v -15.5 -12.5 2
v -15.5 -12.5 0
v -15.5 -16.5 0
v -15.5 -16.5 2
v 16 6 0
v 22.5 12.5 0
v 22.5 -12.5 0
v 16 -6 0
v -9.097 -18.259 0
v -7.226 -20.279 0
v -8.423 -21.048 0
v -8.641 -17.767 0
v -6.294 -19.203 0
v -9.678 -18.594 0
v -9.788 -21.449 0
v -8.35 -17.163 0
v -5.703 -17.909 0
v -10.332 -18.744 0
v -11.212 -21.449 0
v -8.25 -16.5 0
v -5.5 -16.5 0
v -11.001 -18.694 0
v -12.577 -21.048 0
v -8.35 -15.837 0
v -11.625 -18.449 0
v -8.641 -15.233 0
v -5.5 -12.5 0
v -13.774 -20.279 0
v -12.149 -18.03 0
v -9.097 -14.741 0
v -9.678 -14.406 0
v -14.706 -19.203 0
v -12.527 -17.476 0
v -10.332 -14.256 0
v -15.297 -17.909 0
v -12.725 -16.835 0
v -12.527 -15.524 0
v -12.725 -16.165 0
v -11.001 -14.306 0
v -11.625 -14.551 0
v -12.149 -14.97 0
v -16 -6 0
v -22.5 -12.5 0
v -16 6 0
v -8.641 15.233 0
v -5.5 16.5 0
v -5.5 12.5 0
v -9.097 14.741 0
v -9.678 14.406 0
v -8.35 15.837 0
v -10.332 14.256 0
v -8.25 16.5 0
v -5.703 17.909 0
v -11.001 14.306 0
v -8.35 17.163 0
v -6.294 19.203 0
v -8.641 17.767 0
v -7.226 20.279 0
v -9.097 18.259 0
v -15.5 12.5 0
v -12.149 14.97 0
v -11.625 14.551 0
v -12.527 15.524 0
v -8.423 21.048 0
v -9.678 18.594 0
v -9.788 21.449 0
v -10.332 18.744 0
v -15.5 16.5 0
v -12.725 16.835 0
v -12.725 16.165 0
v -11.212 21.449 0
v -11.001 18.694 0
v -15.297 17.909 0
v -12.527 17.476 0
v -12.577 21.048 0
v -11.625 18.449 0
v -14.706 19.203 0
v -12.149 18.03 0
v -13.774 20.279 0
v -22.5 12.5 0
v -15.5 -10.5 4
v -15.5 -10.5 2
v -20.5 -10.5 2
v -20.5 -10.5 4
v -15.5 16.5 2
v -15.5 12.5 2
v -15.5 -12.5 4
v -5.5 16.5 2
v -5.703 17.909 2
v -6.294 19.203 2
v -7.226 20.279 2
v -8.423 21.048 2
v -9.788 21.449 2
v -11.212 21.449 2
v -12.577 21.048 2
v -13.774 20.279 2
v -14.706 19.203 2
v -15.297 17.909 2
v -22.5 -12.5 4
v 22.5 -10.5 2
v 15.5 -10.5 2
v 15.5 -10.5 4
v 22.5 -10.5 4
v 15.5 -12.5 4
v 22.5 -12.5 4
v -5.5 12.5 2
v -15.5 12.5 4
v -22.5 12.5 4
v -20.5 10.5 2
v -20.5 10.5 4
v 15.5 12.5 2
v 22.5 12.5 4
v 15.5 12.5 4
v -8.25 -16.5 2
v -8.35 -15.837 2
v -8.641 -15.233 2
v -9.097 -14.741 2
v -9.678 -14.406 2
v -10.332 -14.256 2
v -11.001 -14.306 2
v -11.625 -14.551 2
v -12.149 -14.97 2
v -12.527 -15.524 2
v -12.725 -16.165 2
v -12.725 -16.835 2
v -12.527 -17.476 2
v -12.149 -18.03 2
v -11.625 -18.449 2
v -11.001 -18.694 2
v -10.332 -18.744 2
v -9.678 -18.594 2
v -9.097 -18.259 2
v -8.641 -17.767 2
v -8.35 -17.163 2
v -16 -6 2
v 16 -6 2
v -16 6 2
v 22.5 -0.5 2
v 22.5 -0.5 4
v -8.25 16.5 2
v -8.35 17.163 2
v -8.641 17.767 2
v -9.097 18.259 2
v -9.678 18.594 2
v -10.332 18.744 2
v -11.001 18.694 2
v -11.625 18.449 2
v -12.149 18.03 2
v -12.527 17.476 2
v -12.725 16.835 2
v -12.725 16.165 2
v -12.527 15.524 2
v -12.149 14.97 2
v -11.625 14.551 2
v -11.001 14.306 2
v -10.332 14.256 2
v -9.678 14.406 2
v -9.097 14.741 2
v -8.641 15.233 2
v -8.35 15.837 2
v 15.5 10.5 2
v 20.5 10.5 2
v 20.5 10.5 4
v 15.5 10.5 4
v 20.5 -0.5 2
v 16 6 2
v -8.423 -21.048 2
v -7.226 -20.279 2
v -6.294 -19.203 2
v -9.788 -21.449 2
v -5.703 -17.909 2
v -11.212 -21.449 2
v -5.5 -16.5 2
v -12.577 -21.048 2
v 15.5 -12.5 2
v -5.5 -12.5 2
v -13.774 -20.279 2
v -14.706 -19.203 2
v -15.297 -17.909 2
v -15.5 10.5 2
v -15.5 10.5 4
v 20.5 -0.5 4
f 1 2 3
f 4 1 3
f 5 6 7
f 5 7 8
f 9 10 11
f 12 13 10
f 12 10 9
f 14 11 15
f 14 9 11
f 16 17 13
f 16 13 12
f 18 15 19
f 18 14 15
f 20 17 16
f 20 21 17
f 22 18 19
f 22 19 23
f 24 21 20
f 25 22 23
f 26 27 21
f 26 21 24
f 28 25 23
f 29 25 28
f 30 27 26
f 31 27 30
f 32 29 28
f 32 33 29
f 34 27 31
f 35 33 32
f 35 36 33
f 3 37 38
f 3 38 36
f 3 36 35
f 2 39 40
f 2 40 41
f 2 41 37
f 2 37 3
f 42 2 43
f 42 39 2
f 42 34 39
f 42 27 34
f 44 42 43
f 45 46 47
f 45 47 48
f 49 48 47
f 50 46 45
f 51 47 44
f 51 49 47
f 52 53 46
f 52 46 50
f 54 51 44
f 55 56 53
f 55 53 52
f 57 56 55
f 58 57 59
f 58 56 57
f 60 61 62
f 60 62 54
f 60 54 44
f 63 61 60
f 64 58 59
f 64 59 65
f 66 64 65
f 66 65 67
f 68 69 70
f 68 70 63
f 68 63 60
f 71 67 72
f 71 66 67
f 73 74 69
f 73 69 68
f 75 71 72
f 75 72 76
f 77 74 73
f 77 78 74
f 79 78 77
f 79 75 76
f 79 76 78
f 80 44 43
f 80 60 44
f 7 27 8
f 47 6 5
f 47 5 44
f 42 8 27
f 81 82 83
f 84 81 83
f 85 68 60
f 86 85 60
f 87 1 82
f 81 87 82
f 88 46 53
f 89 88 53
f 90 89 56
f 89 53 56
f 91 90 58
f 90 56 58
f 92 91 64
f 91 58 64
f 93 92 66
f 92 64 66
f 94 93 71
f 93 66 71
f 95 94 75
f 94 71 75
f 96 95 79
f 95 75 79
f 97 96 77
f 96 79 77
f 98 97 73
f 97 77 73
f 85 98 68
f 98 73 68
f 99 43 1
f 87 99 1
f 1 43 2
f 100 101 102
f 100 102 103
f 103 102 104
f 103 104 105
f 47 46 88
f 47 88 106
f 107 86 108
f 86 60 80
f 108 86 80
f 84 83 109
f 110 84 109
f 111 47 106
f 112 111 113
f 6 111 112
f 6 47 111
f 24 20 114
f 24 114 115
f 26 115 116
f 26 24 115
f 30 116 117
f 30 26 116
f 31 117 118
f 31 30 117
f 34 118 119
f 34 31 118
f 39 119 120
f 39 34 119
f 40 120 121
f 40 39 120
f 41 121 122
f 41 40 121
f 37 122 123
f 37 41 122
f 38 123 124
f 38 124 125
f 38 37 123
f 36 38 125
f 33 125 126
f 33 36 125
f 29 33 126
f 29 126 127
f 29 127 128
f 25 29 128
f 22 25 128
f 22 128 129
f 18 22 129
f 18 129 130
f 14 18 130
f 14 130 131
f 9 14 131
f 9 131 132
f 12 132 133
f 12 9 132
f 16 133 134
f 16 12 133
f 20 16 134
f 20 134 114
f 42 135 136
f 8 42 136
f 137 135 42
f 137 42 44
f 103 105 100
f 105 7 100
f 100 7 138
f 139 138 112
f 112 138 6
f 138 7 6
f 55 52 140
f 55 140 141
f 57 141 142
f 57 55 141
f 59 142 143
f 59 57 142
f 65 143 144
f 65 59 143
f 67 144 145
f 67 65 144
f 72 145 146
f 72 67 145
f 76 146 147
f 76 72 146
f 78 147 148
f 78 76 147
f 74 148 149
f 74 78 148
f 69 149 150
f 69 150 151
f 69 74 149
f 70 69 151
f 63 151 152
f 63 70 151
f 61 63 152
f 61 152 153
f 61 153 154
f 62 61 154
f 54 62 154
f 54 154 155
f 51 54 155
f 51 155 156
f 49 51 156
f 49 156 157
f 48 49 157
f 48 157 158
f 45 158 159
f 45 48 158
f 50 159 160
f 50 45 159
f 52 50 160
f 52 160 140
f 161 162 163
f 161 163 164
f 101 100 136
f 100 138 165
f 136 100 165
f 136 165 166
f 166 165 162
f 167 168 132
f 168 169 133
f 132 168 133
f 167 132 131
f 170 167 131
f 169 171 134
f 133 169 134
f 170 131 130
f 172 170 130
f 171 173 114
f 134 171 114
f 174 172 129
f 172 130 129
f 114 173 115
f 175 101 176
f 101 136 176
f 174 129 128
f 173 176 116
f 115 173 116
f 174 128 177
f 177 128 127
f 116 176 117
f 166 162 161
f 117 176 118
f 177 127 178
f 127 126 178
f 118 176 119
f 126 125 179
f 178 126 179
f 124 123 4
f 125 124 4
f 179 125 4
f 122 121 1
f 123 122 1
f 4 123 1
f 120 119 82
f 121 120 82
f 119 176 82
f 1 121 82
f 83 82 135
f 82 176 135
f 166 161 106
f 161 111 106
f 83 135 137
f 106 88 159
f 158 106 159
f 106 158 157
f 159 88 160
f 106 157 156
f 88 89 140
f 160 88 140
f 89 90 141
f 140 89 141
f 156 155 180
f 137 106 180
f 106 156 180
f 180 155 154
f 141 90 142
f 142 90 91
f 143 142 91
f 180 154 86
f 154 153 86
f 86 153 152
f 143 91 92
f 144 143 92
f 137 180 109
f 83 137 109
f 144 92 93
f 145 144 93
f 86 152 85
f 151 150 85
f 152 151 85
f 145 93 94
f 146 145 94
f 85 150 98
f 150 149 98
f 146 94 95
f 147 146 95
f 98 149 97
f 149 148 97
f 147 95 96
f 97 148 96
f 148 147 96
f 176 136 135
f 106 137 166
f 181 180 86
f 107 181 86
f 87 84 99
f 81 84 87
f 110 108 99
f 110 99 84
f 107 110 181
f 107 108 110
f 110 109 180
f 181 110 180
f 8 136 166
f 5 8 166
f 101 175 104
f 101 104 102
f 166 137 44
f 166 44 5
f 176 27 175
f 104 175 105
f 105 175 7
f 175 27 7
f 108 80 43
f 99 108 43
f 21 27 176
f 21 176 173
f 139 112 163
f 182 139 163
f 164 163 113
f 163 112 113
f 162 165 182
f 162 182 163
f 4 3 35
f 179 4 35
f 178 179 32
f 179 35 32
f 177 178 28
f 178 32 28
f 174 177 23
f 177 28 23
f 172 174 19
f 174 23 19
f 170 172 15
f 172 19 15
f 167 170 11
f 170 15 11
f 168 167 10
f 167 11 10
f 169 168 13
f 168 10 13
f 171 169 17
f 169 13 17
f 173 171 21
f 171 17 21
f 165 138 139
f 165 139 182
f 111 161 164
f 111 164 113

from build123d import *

# Parameters (mm, degrees)
SKETCH002_R  = 2.25
PAD002_DEPTH = 2
SKETCH003_W  = 7
SKETCH003_H  = 2
PAD003_DEPTH = 2
SKETCH004_W  = 32
SKETCH004_H  = 12
POCKET_DEPTH = 2


with BuildPart() as part:
    # Sketch002 → Pad002 (new body)
    with BuildSketch(Plane.XY):
        with BuildLine():
            Line((22.5, 12.5), (22.5, -12.5))
            Line((22.5, -12.5), (-5.5, -12.5))
            Line((-5.5, -12.5), (-5.5, -16.5))
            ThreePointArc((-15.5, -16.5), (-10.5, -21.5), (-5.5, -16.5))
            Line((-15.5, -12.5), (-15.5, -16.5))
            Line((-22.5, -12.5), (-15.5, -12.5))
            Line((-22.5, 12.5), (-22.5, -12.5))
            Line((-15.5, 12.5), (-22.5, 12.5))
            Line((-15.5, 16.5), (-15.5, 12.5))
            ThreePointArc((-5.5, 16.5), (-10.5, 21.5), (-15.5, 16.5))
            Line((-5.5, 16.5), (-5.5, 12.5))
            Line((-5.5, 12.5), (22.5, 12.5))
        make_face()
        with Locations((-10.5, 16.5)):
            Circle(SKETCH002_R, mode=Mode.SUBTRACT)
        with Locations((-10.5, -16.5)):
            Circle(SKETCH002_R, mode=Mode.SUBTRACT)
    extrude(amount=PAD002_DEPTH)

    # Sketch003 (on Face16 of Pad002) → Pad003 (join)
    with BuildSketch(Plane.XY.offset(2)):
        with Locations((19, -11.5)):
            Rectangle(SKETCH003_W, SKETCH003_H)
        Polygon((20.5, 10.5), (15.5, 10.5), (15.5, 12.5), (22.5, 12.5), (22.5, -0.5), (20.5, -0.5), align=None)
        Polygon((-15.5, 12.5), (-22.5, 12.5), (-22.5, -12.5), (-15.5, -12.5), (-15.5, -10.5), (-20.5, -10.5), (-20.5, 10.5), (-15.5, 10.5), align=None)
    extrude(amount=PAD003_DEPTH)

    # Sketch004 (on Face4 of Pad003) → Pocket (cut)
    with BuildSketch(Plane.XY.offset(2)):
        Rectangle(SKETCH004_W, SKETCH004_H)
    extrude(amount=-POCKET_DEPTH, mode=Mode.SUBTRACT)


solid = part.part
